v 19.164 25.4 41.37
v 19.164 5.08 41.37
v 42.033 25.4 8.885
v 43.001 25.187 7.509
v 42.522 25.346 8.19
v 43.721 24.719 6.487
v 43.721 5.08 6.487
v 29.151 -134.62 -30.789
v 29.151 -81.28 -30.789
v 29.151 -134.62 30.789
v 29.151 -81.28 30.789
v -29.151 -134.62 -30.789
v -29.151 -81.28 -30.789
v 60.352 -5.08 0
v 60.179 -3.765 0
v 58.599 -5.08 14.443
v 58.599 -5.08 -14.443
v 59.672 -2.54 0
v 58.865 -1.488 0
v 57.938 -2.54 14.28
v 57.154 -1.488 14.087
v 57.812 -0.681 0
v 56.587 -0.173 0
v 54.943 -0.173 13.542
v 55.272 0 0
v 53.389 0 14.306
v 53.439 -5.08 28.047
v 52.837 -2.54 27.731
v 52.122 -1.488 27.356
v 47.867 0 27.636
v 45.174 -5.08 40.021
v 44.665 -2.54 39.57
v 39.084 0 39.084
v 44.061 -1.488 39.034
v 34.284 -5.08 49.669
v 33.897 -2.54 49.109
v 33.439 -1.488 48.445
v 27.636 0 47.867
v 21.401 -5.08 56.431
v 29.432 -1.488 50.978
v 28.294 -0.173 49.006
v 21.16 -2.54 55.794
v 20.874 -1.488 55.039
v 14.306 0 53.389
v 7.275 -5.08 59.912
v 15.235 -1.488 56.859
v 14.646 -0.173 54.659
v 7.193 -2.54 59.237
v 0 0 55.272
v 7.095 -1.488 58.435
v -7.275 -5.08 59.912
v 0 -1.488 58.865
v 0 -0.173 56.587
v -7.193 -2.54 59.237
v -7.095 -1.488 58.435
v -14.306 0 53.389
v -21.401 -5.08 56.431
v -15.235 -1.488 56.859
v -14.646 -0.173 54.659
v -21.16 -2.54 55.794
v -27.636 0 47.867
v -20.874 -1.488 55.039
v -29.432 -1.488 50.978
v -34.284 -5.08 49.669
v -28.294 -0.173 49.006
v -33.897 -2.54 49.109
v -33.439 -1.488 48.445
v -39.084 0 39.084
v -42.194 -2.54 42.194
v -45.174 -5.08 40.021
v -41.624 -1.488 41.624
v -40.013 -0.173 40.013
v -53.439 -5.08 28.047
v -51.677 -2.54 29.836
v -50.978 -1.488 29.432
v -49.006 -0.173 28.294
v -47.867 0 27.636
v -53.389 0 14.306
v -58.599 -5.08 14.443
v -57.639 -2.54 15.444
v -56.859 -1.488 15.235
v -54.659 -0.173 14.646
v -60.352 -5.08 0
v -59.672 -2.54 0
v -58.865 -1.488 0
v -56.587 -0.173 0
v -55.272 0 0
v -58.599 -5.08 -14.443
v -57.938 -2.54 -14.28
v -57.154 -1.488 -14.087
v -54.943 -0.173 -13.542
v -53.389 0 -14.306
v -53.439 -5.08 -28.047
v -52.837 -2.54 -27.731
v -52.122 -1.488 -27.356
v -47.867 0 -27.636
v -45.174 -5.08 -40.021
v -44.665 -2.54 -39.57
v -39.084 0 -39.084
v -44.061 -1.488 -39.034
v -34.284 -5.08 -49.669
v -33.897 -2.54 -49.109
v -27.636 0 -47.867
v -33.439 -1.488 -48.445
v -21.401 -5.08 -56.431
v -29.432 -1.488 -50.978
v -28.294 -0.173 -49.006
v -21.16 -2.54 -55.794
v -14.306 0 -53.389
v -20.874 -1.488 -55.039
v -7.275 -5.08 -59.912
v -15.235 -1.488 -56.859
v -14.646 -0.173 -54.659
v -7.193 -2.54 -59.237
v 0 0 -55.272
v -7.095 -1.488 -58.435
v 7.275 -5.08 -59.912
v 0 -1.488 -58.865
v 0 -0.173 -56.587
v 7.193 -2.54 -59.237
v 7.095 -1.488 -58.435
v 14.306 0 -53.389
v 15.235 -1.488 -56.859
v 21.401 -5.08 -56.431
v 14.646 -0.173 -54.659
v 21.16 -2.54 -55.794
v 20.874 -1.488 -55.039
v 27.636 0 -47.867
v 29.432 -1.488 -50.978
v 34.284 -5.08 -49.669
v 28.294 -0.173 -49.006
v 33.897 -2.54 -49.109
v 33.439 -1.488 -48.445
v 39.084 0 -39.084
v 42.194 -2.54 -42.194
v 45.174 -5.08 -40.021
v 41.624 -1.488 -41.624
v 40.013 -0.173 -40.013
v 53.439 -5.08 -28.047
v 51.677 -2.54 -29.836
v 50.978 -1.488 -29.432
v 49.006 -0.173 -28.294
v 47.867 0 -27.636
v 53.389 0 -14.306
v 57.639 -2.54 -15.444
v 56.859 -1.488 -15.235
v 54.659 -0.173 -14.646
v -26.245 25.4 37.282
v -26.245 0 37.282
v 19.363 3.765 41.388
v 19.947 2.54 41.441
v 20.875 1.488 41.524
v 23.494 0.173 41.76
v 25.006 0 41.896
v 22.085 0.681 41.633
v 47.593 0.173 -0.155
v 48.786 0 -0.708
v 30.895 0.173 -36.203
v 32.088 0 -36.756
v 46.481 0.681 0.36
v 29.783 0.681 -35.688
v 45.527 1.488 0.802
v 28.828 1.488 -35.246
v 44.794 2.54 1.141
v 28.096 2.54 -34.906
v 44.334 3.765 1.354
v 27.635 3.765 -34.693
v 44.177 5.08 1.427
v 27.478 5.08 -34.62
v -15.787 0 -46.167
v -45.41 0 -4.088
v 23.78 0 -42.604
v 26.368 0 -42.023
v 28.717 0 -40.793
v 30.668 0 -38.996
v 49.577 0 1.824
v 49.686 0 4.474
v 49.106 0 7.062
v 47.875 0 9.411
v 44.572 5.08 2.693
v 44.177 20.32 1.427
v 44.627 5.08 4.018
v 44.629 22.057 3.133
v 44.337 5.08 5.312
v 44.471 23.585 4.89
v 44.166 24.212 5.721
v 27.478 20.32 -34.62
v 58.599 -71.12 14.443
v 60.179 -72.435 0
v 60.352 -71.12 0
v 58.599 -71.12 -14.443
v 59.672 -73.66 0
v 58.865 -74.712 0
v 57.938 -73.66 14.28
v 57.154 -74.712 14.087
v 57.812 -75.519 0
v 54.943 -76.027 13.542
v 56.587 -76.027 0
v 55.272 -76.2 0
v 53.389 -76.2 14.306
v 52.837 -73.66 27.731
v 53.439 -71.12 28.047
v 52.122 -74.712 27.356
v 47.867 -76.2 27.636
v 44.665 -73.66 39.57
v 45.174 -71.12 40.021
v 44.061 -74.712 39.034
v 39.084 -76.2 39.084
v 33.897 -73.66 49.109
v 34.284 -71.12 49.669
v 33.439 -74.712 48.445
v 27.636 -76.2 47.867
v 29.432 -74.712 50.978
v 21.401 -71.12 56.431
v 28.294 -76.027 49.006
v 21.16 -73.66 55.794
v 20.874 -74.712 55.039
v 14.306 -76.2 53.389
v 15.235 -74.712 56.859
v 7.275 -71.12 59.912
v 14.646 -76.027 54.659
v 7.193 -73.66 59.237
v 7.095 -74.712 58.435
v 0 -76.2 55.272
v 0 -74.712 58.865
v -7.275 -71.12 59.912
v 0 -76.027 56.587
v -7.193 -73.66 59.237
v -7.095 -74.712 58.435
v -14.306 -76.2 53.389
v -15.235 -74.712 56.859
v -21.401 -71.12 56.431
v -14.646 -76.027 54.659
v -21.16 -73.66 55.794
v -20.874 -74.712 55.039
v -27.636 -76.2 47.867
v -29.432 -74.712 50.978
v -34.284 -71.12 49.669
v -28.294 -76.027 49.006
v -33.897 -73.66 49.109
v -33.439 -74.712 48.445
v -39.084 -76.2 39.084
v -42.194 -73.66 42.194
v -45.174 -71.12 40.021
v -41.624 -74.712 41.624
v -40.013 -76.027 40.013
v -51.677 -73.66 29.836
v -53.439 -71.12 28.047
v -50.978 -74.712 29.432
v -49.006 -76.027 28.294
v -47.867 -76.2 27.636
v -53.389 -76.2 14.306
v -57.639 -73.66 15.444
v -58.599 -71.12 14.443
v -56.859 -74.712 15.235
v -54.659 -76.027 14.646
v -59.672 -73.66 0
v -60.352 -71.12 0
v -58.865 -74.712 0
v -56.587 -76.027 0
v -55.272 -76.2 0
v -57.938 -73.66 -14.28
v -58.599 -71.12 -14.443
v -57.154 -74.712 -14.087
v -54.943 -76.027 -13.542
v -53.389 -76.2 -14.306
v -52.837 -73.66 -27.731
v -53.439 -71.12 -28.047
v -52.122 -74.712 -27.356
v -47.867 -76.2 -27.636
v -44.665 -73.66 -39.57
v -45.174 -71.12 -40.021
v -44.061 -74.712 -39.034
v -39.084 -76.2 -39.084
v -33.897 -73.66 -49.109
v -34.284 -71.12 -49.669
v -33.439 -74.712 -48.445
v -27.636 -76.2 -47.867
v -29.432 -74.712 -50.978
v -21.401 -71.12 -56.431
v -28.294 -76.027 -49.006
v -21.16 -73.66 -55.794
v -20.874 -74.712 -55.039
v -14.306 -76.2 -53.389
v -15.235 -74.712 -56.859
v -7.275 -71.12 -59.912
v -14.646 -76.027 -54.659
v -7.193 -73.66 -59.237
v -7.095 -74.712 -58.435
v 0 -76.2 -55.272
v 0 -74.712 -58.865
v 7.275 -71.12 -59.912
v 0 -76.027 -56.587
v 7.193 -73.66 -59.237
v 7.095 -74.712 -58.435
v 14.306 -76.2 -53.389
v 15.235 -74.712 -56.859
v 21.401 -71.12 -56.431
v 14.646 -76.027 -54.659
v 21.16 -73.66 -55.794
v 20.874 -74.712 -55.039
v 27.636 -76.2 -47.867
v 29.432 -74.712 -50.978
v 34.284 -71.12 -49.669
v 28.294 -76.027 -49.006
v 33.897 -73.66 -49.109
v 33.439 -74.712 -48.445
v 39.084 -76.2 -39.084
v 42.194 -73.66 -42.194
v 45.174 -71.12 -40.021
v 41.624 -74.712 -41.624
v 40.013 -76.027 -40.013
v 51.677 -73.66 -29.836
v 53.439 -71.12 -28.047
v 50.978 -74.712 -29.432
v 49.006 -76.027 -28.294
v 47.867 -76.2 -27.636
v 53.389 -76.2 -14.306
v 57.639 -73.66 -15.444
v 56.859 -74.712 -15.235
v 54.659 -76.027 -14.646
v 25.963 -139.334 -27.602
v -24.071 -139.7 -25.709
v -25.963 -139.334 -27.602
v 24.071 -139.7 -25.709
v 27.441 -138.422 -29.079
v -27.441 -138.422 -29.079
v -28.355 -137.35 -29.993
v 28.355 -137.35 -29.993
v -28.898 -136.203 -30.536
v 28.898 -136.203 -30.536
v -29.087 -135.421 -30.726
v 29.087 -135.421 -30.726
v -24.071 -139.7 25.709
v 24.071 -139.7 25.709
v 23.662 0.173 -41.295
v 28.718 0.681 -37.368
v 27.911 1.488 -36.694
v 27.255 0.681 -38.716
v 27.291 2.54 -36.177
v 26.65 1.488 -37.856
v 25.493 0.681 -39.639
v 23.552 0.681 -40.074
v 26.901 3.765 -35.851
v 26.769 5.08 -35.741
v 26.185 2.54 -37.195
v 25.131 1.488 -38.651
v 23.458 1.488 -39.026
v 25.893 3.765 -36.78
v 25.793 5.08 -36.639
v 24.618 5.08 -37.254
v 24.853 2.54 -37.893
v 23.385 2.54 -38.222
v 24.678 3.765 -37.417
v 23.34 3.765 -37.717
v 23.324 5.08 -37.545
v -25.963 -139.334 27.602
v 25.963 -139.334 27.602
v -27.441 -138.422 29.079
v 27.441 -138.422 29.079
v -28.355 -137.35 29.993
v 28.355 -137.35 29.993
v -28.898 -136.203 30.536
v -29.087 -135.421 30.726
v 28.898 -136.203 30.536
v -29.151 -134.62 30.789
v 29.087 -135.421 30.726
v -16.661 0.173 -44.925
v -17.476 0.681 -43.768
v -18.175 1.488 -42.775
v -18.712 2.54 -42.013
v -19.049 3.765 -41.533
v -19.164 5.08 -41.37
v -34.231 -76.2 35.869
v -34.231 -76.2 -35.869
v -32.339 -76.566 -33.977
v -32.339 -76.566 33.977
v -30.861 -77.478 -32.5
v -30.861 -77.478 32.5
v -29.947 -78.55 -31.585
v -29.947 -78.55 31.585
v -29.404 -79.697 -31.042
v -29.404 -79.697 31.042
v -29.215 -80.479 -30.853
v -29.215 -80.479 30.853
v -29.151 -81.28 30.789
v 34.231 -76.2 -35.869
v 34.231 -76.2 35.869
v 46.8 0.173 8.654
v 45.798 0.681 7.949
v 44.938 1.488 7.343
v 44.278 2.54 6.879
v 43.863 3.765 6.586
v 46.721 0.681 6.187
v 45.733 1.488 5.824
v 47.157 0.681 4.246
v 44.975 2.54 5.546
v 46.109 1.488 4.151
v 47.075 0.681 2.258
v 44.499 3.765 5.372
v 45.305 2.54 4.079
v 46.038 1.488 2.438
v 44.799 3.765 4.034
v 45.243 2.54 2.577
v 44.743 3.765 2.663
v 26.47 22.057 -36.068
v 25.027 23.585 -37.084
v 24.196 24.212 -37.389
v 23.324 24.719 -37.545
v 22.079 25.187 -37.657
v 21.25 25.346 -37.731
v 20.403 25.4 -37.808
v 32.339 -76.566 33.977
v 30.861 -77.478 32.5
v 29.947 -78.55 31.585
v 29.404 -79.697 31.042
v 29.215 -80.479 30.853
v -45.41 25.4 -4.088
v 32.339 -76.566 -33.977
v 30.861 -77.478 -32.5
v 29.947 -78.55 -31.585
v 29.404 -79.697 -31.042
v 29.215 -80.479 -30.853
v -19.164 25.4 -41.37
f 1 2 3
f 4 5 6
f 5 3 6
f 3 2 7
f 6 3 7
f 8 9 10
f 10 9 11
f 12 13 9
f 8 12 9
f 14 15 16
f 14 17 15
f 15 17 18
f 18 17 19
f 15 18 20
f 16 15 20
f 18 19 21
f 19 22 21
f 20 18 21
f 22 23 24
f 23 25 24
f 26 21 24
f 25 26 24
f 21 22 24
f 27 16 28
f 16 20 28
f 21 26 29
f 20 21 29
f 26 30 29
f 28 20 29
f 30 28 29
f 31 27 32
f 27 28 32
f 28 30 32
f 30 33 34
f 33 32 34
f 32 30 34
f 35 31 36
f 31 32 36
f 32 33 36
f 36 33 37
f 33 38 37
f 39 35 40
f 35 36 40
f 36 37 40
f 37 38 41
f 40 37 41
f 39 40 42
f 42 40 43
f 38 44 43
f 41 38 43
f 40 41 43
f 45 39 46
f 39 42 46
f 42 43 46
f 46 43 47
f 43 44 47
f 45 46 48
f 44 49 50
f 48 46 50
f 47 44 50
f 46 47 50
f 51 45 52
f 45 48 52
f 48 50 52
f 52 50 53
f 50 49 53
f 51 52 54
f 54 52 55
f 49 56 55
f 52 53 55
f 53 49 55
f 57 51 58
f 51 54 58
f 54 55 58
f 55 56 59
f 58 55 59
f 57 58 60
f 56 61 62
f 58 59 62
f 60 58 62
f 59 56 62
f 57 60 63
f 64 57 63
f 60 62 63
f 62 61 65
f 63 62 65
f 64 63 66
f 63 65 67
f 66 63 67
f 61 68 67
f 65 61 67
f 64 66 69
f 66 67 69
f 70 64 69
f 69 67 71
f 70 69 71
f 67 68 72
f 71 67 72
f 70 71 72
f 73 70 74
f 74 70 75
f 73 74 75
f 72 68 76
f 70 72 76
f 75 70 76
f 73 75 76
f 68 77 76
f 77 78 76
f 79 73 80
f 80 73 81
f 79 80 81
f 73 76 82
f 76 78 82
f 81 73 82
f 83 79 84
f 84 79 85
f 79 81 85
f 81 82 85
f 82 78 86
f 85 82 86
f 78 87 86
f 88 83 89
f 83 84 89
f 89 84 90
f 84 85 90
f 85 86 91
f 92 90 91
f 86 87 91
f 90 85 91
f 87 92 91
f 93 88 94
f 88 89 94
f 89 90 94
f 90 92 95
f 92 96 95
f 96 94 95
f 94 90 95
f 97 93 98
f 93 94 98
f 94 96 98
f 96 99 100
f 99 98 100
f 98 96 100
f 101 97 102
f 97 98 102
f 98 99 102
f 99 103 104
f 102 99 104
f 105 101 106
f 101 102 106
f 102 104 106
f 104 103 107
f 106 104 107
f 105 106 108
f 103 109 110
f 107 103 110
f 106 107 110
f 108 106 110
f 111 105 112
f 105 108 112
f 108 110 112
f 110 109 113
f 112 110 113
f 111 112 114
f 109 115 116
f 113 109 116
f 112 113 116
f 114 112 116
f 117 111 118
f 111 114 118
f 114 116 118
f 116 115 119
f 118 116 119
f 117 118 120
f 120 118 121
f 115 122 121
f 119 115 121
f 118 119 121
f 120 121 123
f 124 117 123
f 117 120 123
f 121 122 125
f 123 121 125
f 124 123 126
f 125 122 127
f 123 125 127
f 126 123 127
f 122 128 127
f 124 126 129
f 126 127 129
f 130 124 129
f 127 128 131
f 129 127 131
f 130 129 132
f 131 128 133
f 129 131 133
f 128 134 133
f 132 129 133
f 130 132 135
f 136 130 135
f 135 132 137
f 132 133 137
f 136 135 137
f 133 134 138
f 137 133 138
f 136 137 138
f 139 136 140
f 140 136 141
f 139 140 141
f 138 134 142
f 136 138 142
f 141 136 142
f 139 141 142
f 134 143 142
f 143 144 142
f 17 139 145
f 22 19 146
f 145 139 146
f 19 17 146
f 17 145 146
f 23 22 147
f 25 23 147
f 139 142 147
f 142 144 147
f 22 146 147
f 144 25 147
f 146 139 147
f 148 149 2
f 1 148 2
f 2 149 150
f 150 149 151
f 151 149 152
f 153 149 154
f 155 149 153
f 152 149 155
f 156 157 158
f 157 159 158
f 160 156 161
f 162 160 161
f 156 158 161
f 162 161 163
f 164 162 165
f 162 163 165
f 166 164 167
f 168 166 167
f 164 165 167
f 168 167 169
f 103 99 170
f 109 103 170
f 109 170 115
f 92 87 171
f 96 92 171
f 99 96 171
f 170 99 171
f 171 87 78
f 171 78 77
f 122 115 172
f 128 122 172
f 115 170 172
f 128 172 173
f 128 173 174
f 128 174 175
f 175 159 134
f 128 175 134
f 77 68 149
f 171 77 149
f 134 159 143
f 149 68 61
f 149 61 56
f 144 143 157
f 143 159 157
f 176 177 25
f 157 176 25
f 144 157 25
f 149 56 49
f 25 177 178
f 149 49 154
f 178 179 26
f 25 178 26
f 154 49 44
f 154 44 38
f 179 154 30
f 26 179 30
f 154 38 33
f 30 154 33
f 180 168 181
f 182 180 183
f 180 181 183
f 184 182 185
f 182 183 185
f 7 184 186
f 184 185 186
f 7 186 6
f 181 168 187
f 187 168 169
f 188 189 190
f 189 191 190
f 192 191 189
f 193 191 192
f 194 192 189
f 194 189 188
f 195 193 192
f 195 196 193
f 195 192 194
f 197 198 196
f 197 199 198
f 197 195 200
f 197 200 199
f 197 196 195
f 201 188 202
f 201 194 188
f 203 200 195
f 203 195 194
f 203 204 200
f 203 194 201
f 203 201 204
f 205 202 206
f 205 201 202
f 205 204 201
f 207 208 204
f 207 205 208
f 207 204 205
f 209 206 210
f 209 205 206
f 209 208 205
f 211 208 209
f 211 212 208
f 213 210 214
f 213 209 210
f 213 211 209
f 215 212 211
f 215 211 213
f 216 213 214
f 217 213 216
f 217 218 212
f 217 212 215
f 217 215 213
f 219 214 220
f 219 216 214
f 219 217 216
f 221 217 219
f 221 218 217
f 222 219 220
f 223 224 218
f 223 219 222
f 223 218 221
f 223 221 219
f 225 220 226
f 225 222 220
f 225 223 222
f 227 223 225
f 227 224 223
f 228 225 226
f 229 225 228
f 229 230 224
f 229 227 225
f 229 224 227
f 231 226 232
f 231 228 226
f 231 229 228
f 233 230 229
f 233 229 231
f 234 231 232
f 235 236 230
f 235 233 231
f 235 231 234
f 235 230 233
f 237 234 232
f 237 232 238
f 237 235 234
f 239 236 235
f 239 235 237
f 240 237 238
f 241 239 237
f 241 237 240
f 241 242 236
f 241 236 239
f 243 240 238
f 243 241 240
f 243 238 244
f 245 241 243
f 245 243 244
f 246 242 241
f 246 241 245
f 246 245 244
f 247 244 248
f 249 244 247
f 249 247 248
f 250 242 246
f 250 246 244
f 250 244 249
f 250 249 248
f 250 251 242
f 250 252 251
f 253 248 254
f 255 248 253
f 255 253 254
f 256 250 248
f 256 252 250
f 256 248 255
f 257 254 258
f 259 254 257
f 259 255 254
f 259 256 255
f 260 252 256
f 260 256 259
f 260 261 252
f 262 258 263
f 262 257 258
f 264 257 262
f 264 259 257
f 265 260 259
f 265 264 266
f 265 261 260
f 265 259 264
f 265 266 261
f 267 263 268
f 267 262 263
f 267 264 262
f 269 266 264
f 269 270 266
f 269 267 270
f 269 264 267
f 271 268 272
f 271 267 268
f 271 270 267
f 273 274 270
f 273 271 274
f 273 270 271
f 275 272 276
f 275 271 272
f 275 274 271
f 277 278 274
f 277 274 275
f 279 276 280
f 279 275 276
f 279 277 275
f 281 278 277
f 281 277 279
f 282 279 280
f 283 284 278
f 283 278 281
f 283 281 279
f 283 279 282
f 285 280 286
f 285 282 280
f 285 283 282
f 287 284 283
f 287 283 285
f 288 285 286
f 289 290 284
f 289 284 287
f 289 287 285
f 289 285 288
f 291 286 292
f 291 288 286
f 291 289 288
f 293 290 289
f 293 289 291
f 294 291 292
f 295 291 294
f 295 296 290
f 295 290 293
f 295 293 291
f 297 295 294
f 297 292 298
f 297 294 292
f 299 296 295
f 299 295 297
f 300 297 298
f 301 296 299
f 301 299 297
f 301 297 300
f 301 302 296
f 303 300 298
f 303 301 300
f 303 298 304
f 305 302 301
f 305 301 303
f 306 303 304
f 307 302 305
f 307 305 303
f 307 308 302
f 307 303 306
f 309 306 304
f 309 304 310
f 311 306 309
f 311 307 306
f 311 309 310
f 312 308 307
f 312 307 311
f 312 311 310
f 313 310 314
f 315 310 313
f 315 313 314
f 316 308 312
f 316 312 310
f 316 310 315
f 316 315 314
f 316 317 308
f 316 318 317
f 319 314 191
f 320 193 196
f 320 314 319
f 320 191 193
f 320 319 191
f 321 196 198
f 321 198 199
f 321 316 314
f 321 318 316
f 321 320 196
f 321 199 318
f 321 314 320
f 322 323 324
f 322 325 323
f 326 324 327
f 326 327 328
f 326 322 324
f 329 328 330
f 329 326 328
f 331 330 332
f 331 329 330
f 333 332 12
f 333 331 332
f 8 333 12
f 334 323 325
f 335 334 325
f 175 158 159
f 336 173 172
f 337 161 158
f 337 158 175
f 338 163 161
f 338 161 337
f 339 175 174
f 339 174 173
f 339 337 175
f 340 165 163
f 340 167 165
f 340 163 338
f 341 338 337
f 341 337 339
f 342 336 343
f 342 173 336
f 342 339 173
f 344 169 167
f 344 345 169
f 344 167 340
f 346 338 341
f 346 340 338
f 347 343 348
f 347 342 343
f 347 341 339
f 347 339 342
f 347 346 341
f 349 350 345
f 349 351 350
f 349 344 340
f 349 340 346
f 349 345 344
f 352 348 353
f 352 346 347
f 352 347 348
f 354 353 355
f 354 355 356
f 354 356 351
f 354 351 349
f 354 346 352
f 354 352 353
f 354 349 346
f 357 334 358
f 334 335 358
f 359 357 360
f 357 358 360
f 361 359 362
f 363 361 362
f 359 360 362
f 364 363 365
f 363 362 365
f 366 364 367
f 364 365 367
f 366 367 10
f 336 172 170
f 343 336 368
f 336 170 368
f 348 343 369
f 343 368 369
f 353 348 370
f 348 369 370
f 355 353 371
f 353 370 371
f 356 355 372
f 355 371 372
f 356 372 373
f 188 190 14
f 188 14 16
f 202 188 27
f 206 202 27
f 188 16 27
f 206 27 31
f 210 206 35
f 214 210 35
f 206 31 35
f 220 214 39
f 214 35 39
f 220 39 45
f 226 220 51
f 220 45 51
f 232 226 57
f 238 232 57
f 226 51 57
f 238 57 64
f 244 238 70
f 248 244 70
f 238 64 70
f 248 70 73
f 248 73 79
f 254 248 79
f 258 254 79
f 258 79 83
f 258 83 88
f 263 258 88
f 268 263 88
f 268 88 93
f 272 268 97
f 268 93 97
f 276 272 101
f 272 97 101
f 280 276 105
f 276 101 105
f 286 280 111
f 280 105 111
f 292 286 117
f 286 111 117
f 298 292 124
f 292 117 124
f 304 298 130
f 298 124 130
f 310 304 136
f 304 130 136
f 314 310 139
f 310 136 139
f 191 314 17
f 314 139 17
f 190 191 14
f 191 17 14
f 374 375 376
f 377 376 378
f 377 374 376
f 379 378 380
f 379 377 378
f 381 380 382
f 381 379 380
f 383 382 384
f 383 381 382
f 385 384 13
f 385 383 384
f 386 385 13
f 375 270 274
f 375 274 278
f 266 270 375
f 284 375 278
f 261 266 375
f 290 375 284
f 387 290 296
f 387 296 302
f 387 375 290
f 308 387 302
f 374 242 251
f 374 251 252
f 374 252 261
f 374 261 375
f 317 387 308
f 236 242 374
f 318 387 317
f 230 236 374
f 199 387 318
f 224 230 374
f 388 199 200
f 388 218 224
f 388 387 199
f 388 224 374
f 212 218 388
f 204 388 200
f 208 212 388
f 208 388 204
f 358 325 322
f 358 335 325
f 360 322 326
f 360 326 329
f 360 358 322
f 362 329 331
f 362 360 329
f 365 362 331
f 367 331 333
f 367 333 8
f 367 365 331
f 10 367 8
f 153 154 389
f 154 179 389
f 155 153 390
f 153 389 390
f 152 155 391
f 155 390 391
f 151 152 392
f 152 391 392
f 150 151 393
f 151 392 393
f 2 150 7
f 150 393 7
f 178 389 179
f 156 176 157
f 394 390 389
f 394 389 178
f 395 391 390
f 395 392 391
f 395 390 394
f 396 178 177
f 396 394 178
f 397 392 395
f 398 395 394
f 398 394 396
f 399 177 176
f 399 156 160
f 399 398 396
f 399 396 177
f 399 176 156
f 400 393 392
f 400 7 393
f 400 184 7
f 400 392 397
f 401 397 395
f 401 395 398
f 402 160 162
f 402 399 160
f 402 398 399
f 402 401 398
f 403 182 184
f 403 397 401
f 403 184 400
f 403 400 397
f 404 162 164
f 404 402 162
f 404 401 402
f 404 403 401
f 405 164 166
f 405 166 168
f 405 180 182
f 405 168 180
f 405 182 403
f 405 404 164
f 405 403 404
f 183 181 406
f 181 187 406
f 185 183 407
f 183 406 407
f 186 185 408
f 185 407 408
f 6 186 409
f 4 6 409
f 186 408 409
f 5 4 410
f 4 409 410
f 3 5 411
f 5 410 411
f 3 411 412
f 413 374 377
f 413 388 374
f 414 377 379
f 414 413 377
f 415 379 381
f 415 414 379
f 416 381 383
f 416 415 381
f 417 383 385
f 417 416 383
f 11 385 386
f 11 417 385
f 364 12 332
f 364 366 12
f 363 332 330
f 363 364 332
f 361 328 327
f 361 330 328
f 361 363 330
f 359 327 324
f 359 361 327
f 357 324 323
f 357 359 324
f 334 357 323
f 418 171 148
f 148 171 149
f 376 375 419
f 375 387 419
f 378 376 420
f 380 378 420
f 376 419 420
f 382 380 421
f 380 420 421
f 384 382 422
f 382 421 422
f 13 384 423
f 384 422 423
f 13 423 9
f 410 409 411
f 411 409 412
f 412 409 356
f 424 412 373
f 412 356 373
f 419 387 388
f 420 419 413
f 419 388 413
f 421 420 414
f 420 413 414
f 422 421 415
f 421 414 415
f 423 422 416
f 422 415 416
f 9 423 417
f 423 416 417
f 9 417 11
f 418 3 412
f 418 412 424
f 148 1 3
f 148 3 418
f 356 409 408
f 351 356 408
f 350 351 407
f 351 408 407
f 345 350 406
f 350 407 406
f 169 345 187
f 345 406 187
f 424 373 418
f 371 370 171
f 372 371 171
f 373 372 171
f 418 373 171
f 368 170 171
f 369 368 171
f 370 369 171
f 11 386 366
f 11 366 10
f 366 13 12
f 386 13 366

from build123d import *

# Parameters (mm, degrees)
F0_R     = 60.3524841782
F1_DEPTH = 76.2
F3_W     = 58.3018623292
F3_H     = 61.5784339607
F4_DEPTH = 63.5
F7_DEPTH = 25.4
F8_F1_R  = 5.08
F8_F2_R  = 5.08
F9_R     = 5.08
F10_R    = 5.08


with BuildPart() as f1:
    # F0 (on Front) → F1 (new body)
    with BuildSketch(Plane.XZ):
        Circle(F0_R)
    extrude(amount=F1_DEPTH)

    # F3 (on face) → F4 (join)
    with BuildSketch(Plane.XZ.offset(76.2)):
        Rectangle(F3_W, F3_H)
    extrude(amount=F4_DEPTH)

    # F6 (on face) → F7 (join)
    with BuildSketch(Plane(origin=(0, 0, 0), x_dir=(-1, 0, 0), z_dir=(0, 1, 0))):
        Polygon((19.1640303054, -41.3700494554), (45.4095289369, -4.0884876443), (26.2454986315, 37.2815618111), (-19.1640303054, 41.3700494554), (-45.4095289369, 4.0884876443), (-26.2454986315, -37.2815618111), align=None)
    extrude(amount=F7_DEPTH)

    # F8: fillet of radius 5.08 on 4 edges, made by hand

    # F8_f1
    f8_f1_edges = [f1.edges().sort_by_distance(p)[0] for p in [
        (45.4095289369, 12.7, 4.0884876443),
        (26.2454986315, 12.7, -37.2815618111),
        (35.8275137842, 25.4, -16.5965370834),
    ]]
    fillet(f8_f1_edges, radius=F8_F1_R)

    # F8_f2
    f8_f2_edges = [f1.edges().sort_by_distance(p)[0] for p in [
        (35.8275137842, 0, -16.5965370834),
        (44.6268163137, 0, 4.0180154116),
        (25.7931115761, 0, -36.6389489119),
    ]]
    fillet(f8_f2_edges, radius=F8_F2_R)

    # F9
    f9_edges = [f1.edges().sort_by_distance(p)[0] for p in [
        (0, -139.7, -30.789217),
        (29.150931, -139.7, 0),
        (0, -139.7, 30.789217),
        (-29.150931, -139.7, 0),
        (-60.352484, -76.2, 0),
        (0, -76.2, -30.789217),
        (29.150931, -76.2, 0),
        (0, -76.2, 30.789217),
        (-29.150931, -76.2, 0),
    ]]
    fillet(f9_edges, radius=F9_R)

    # F10
    f10_edges = [f1.edges().sort_by_distance(p)[0] for p in [
        (-60.352484, 0, 0),
    ]]
    fillet(f10_edges, radius=F10_R)


solid = f1.part
